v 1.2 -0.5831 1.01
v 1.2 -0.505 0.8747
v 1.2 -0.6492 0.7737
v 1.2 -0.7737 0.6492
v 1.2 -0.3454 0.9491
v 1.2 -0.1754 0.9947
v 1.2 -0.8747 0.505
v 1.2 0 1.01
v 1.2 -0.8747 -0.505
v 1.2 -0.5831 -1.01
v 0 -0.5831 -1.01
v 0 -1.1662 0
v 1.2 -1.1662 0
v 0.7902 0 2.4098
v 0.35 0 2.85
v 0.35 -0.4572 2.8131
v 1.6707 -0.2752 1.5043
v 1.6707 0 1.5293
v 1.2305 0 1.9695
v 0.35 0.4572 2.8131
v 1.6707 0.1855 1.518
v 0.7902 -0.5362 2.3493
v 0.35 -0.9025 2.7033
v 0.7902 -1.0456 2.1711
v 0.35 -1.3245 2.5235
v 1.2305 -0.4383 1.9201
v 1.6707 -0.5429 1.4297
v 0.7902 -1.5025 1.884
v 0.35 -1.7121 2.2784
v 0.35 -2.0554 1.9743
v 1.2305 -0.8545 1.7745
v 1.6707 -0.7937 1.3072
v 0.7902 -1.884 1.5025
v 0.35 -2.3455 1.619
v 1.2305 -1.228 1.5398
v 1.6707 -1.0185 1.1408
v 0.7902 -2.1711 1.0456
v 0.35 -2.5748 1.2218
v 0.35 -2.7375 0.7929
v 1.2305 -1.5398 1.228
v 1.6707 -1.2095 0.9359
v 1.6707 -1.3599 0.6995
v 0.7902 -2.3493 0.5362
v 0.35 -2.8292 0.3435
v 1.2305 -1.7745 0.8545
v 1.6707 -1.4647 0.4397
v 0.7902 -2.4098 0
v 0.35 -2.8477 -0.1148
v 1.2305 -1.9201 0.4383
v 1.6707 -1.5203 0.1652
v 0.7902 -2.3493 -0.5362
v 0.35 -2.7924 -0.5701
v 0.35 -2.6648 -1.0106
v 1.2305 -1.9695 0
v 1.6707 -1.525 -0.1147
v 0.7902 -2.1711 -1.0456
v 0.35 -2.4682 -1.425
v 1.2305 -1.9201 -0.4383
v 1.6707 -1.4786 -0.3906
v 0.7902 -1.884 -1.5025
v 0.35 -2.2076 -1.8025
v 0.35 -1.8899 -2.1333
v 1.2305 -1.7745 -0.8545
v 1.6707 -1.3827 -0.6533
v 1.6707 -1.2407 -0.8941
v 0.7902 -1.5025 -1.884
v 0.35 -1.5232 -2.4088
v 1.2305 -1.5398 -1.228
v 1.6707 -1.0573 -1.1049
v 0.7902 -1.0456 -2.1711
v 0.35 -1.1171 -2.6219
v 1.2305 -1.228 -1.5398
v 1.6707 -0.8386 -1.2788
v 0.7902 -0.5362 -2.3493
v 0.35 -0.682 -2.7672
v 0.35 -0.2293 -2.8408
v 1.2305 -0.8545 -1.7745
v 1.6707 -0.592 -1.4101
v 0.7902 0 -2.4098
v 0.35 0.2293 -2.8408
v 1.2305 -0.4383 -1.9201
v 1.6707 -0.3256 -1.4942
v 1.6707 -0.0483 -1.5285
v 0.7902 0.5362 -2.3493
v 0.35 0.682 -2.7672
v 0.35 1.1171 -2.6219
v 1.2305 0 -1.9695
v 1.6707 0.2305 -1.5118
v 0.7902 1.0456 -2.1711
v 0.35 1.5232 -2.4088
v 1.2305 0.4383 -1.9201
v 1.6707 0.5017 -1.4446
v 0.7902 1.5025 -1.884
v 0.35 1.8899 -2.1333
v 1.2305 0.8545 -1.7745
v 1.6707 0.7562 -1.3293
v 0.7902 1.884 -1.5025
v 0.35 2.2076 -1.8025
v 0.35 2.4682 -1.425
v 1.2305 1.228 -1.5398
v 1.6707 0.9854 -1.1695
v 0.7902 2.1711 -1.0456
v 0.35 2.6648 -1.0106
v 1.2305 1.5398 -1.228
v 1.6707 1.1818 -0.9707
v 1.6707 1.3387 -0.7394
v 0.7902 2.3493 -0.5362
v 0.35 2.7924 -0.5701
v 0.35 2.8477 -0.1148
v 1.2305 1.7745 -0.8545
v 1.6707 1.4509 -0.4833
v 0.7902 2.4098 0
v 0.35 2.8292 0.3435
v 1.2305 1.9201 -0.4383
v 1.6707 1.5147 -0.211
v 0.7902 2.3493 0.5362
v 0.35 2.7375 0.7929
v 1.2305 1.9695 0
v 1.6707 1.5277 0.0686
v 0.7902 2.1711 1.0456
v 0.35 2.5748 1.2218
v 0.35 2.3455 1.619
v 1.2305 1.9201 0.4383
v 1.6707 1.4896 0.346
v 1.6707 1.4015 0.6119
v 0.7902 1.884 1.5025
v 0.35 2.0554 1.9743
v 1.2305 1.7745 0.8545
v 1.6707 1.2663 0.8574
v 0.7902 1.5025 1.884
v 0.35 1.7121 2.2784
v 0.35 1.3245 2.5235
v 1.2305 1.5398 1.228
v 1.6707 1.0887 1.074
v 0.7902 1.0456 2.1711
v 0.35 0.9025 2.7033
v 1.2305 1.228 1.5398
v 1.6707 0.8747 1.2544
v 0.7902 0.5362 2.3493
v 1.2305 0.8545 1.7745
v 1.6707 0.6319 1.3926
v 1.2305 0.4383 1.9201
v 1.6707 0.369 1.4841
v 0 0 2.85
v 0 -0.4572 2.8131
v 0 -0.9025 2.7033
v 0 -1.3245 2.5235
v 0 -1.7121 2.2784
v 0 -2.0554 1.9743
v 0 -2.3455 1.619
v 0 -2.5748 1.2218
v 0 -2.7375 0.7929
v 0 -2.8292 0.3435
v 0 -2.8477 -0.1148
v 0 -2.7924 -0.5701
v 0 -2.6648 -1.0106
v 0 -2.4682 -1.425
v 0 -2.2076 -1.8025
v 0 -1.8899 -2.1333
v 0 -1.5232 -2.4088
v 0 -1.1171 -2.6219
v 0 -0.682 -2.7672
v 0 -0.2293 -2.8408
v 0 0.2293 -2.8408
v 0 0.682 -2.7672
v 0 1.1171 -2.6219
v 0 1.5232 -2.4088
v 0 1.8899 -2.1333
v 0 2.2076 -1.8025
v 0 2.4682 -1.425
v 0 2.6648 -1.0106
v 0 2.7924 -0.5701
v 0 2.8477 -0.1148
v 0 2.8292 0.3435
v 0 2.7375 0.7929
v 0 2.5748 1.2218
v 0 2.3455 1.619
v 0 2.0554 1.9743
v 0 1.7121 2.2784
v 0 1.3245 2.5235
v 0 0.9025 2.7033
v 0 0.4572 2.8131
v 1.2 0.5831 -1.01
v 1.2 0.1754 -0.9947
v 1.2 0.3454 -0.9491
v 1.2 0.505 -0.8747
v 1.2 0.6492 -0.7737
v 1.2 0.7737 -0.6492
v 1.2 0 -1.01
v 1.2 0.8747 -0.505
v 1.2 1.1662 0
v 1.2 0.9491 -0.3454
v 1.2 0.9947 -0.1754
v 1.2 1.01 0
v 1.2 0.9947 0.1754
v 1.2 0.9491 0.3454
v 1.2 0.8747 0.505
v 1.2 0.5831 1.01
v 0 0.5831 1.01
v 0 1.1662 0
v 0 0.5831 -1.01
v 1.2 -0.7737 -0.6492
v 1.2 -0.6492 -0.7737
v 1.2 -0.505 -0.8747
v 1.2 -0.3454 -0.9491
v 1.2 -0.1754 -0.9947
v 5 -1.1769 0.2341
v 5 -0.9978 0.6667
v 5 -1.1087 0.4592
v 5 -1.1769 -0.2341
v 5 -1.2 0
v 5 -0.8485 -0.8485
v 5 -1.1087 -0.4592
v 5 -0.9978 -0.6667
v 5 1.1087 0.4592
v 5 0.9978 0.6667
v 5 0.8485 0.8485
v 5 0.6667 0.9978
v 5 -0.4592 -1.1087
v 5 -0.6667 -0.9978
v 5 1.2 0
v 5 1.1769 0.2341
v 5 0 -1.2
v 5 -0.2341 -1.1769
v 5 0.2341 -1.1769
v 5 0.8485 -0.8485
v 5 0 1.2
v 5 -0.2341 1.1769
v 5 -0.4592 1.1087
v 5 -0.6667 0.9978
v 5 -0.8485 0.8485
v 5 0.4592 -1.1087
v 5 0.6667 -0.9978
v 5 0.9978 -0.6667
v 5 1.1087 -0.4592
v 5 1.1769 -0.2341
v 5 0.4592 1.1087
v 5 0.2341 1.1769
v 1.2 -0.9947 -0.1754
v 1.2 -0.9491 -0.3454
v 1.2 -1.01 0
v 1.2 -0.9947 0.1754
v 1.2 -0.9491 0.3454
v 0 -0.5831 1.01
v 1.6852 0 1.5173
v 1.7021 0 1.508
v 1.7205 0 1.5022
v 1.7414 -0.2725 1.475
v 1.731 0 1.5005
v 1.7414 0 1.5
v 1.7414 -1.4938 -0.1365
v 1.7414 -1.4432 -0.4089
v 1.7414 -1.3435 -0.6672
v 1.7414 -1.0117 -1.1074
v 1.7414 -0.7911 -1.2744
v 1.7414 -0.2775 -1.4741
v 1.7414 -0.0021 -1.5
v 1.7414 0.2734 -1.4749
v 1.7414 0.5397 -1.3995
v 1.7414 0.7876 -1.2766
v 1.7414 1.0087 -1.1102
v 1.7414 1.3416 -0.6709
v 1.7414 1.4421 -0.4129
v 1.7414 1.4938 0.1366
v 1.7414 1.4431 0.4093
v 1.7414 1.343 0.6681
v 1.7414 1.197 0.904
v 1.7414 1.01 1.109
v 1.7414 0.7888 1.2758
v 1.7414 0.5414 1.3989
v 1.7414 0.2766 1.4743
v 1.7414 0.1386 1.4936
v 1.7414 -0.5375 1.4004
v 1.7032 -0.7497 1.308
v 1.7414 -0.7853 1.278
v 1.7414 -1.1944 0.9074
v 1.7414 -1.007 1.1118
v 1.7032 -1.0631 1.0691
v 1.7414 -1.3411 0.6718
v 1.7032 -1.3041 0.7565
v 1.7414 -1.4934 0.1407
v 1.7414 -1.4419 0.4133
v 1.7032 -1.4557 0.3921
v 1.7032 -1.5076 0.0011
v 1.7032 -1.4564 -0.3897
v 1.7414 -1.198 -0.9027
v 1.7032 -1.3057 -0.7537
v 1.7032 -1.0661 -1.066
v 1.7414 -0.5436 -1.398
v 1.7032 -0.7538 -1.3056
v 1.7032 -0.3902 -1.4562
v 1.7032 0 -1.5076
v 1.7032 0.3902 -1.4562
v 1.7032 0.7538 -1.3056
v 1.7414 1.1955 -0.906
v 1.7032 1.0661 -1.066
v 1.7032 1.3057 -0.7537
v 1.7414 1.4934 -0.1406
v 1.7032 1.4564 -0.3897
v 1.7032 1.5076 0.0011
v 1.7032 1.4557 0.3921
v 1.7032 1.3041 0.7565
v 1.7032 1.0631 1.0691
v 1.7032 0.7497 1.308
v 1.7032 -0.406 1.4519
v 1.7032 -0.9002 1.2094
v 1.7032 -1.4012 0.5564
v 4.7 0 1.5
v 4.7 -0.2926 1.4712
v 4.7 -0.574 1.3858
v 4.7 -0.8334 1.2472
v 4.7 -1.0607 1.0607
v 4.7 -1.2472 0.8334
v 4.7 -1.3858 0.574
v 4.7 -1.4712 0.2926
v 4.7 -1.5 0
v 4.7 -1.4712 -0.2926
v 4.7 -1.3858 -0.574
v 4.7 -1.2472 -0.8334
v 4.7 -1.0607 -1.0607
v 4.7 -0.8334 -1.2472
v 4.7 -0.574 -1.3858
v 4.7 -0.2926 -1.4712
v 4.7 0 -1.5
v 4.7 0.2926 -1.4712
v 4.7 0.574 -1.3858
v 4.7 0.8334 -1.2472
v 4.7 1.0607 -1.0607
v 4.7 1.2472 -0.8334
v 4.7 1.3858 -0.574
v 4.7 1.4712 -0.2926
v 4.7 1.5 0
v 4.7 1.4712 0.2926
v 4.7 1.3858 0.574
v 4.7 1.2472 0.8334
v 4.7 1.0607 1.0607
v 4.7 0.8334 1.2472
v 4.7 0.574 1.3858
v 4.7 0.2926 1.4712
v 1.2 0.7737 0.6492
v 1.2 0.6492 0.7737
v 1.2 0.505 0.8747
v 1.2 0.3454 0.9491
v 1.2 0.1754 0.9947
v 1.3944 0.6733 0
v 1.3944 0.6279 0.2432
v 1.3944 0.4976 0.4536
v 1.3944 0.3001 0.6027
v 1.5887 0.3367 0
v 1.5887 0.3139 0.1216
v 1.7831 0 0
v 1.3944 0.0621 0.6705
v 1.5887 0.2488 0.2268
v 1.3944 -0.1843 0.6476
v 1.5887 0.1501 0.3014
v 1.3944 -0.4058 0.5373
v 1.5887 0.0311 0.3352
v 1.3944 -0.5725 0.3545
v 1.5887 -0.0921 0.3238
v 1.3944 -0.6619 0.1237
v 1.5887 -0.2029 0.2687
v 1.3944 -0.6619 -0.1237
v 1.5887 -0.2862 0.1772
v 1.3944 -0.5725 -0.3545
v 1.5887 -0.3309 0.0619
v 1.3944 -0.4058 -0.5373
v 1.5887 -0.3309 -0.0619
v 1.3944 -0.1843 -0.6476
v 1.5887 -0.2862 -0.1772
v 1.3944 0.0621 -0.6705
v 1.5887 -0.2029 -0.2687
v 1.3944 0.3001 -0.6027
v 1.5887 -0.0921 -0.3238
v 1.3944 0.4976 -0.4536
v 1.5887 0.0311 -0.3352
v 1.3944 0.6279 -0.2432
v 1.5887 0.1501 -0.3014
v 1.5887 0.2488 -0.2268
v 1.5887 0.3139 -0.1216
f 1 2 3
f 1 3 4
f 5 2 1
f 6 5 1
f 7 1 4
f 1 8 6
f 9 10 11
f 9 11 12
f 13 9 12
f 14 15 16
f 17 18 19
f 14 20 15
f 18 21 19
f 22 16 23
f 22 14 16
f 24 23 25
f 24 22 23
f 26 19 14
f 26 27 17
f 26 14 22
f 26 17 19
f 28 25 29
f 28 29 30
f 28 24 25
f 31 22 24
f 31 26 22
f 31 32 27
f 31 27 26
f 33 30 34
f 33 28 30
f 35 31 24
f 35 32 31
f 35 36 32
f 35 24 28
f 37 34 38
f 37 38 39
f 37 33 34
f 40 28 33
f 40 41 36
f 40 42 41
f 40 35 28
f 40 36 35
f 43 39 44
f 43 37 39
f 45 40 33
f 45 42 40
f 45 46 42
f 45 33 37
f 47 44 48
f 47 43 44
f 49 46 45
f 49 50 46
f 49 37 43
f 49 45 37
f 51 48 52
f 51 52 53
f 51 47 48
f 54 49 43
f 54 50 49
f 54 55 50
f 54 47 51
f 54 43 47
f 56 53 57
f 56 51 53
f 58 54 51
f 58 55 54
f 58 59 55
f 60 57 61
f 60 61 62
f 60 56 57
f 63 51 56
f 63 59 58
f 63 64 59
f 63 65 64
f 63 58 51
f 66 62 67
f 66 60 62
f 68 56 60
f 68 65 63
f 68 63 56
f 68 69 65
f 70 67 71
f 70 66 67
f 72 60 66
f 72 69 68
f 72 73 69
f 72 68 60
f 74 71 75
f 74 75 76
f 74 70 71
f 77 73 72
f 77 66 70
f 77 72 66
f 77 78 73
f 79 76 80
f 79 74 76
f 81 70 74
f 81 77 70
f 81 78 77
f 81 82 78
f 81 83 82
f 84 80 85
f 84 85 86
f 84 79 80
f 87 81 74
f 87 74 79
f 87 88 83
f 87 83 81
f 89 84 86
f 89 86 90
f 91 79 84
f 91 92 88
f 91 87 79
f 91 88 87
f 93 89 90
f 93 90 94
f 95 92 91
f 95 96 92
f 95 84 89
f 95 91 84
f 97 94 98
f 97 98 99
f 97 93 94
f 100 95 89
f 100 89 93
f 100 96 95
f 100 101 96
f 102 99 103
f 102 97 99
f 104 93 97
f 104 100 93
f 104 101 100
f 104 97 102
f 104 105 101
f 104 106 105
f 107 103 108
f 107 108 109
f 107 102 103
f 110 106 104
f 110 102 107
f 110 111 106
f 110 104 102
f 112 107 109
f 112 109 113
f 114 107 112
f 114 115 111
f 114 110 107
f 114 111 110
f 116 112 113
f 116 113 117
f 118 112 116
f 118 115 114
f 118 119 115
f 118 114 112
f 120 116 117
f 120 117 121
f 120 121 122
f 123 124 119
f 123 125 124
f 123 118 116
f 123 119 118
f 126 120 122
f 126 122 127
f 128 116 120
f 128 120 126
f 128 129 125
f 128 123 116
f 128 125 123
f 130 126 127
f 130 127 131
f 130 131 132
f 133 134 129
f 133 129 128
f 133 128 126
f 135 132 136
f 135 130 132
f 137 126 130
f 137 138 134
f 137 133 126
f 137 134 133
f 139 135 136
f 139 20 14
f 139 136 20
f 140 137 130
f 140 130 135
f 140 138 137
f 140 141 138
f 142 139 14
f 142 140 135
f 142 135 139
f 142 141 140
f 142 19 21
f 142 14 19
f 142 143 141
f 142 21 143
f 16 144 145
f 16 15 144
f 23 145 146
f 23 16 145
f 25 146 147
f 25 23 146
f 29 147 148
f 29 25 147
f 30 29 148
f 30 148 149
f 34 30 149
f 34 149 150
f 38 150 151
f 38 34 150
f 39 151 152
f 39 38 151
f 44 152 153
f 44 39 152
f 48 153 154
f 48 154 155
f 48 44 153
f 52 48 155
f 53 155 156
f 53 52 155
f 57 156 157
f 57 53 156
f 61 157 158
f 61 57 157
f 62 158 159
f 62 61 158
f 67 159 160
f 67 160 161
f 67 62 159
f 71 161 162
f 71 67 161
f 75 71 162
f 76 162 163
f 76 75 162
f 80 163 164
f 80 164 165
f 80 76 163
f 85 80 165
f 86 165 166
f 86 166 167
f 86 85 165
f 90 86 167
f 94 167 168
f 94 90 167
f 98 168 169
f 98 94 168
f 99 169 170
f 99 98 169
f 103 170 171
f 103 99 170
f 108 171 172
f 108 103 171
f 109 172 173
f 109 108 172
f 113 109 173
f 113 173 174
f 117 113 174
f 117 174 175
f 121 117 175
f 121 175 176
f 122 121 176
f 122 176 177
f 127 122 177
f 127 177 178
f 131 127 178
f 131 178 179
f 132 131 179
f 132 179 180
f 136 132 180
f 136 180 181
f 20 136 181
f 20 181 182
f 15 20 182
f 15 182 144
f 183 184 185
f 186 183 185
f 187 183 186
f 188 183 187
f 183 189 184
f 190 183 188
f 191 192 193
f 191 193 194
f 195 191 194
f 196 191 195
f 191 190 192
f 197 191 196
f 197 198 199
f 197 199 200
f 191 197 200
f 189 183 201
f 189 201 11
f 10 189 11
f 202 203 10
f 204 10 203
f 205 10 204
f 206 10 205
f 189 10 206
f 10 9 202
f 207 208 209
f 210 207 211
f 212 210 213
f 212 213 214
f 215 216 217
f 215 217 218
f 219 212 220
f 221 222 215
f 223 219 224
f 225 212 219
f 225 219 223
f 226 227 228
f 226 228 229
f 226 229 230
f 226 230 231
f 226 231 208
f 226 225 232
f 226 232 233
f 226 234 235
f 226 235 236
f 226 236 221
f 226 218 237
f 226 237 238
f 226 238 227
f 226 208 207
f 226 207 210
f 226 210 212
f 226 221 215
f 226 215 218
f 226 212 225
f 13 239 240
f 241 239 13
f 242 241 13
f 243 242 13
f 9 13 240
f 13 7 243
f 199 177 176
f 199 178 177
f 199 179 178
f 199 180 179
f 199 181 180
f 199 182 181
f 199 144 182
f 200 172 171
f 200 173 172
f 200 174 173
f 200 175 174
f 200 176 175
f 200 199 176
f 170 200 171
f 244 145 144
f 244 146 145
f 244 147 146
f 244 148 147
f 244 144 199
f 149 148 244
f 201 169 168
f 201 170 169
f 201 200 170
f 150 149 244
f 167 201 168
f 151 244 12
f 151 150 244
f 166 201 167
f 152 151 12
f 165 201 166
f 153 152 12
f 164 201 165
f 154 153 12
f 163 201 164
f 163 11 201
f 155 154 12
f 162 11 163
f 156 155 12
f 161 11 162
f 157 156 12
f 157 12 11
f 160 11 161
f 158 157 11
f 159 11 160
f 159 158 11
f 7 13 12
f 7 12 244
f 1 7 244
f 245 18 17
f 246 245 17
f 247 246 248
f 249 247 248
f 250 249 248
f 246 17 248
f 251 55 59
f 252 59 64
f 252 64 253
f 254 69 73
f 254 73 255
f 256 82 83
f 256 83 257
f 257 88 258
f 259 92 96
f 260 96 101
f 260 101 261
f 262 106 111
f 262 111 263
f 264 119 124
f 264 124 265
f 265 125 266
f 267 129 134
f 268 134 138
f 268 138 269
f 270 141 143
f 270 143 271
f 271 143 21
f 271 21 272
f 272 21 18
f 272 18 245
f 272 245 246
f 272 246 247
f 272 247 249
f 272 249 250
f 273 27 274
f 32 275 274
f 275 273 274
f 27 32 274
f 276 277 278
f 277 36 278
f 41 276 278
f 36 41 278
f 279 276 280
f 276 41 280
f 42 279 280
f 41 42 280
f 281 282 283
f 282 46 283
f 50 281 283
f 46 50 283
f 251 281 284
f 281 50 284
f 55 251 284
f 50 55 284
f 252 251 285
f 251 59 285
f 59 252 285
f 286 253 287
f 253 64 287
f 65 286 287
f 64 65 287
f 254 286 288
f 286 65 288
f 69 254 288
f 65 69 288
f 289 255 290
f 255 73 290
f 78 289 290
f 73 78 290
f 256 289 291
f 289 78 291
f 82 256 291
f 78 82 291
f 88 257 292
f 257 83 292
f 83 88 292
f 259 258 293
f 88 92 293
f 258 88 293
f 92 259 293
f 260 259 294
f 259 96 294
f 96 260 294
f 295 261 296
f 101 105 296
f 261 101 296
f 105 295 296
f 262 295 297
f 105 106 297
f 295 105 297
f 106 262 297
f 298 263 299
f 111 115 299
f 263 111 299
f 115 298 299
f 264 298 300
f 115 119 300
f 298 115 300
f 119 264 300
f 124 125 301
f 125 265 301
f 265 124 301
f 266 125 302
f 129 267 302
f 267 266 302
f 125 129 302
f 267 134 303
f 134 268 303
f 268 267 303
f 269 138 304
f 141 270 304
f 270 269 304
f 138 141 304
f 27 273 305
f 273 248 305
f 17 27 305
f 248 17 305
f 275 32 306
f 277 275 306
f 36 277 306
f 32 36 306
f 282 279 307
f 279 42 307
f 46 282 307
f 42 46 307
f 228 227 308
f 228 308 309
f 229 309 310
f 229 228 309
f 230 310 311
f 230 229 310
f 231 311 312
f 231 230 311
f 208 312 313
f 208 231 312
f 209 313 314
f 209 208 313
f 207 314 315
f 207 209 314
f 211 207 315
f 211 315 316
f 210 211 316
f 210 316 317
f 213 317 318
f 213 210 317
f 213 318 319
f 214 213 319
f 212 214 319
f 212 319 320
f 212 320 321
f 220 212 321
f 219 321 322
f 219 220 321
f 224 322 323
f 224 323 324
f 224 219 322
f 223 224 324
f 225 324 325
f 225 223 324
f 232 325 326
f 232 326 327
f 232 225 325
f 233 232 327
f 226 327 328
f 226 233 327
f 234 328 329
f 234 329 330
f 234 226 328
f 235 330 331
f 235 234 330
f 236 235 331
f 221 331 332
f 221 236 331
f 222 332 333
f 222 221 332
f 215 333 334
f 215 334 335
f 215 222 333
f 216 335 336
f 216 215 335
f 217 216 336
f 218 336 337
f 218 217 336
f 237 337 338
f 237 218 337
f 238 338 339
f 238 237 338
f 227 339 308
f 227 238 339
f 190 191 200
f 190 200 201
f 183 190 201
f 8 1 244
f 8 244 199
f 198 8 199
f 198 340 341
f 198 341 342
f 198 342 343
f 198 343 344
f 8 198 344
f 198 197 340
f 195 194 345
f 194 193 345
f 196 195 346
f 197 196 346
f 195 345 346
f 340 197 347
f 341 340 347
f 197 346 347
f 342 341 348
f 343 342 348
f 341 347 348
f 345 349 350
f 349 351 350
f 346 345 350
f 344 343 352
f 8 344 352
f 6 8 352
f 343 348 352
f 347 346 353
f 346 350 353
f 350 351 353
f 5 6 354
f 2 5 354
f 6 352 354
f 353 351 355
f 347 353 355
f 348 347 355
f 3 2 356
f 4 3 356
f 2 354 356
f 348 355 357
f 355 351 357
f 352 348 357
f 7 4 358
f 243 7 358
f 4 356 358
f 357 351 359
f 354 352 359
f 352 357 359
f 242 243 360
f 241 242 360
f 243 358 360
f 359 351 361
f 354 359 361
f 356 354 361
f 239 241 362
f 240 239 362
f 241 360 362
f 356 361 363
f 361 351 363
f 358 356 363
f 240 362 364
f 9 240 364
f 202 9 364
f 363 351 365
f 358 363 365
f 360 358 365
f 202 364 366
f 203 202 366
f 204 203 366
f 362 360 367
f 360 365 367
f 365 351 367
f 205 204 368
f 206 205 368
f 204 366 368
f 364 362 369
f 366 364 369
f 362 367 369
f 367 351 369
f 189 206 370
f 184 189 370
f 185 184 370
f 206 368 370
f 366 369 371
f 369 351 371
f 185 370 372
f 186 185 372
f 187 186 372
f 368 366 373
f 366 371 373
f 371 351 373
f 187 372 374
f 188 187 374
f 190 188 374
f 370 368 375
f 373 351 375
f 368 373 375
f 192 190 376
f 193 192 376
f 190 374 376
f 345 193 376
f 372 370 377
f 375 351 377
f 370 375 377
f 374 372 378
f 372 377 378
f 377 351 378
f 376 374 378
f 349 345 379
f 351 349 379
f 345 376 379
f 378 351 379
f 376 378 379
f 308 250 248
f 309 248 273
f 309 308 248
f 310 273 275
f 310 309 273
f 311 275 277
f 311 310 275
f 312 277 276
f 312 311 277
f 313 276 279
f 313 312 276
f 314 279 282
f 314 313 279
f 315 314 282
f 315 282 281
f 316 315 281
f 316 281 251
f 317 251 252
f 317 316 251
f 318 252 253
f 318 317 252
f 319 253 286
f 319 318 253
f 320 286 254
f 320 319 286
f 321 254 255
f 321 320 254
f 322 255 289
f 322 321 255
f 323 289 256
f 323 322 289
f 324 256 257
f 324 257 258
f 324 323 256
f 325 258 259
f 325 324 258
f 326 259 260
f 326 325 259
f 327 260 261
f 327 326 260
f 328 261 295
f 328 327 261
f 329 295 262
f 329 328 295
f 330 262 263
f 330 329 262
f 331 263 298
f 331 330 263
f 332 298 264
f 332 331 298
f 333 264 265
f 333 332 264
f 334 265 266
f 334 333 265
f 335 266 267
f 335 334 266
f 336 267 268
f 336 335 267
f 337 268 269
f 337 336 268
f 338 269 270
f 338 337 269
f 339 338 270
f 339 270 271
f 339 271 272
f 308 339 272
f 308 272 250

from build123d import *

# Parameters (mm, degrees)
FILLET1_R          = 0.1
HEX_START          = -1.2
HEX_2_DEPTH        = 1.2
SKETCH4_R          = 5.337249995
CUT_EXTRUDE1_DEPTH = 3
CHAMFER1_SIZE      = 0.3


with BuildPart() as part:
    # BodySke → BaseBody (revolve)
    with BuildSketch(Plane.XY, mode=Mode.PRIVATE) as basebody_sk:
        Polygon((0, 0), (0, 2.85), (0.35, 2.85), (1.7, 1.5), (7.7195, 1.5), (8, 1.2195), (8, 0), align=None)
    revolve(basebody_sk.sketch.rotate(Axis((0, 0, 0), (1, 0, 0)), 90), axis=Axis((0, 0, 0), (1, 0, 0)))

    # Fillet1
    fillet1_edges = [part.edges().sort_by_distance(p)[0] for p in [
        (1.7, 0, -1.5),
    ]]
    fillet(fillet1_edges, radius=FILLET1_R)

    # Hex 2: read off the stored shape, not the designer's step
    # Hex 2 outline → Hex 2 (cut)
    with BuildSketch(Plane.ZY.offset(HEX_START)):
        Polygon((-1.01, -0.583123772), (0, -1.166247544), (1.01, -0.583123772), (1.01, 0.583123772), (0, 1.166247544), (-1.01, 0.583123772), align=None)
    extrude(amount=HEX_2_DEPTH, mode=Mode.SUBTRACT)

    # Hex 2 2 outline → Hex 2 2 (revolve, cut)
    with BuildSketch(Plane.YX):
        Polygon((1.01, 1.2), (0, 1.783123772), (0, 1.2), align=None)
    revolve(axis=Axis((0, 0, 0), (1, 0, 0)), mode=Mode.SUBTRACT)

    # Sketch4 → Cut-Extrude1 (cut)
    with BuildSketch(Plane(origin=(8, 0, 0), x_dir=(0, 0, -1), z_dir=(1, 0, 0))):
        Circle(SKETCH4_R)
    extrude(amount=-CUT_EXTRUDE1_DEPTH, mode=Mode.SUBTRACT)

    # Chamfer1
    chamfer1_edges = [part.edges().sort_by_distance(p)[0] for p in [
        (5, 0, -1.5),
    ]]
    chamfer(chamfer1_edges, length=CHAMFER1_SIZE)


solid = part.part
